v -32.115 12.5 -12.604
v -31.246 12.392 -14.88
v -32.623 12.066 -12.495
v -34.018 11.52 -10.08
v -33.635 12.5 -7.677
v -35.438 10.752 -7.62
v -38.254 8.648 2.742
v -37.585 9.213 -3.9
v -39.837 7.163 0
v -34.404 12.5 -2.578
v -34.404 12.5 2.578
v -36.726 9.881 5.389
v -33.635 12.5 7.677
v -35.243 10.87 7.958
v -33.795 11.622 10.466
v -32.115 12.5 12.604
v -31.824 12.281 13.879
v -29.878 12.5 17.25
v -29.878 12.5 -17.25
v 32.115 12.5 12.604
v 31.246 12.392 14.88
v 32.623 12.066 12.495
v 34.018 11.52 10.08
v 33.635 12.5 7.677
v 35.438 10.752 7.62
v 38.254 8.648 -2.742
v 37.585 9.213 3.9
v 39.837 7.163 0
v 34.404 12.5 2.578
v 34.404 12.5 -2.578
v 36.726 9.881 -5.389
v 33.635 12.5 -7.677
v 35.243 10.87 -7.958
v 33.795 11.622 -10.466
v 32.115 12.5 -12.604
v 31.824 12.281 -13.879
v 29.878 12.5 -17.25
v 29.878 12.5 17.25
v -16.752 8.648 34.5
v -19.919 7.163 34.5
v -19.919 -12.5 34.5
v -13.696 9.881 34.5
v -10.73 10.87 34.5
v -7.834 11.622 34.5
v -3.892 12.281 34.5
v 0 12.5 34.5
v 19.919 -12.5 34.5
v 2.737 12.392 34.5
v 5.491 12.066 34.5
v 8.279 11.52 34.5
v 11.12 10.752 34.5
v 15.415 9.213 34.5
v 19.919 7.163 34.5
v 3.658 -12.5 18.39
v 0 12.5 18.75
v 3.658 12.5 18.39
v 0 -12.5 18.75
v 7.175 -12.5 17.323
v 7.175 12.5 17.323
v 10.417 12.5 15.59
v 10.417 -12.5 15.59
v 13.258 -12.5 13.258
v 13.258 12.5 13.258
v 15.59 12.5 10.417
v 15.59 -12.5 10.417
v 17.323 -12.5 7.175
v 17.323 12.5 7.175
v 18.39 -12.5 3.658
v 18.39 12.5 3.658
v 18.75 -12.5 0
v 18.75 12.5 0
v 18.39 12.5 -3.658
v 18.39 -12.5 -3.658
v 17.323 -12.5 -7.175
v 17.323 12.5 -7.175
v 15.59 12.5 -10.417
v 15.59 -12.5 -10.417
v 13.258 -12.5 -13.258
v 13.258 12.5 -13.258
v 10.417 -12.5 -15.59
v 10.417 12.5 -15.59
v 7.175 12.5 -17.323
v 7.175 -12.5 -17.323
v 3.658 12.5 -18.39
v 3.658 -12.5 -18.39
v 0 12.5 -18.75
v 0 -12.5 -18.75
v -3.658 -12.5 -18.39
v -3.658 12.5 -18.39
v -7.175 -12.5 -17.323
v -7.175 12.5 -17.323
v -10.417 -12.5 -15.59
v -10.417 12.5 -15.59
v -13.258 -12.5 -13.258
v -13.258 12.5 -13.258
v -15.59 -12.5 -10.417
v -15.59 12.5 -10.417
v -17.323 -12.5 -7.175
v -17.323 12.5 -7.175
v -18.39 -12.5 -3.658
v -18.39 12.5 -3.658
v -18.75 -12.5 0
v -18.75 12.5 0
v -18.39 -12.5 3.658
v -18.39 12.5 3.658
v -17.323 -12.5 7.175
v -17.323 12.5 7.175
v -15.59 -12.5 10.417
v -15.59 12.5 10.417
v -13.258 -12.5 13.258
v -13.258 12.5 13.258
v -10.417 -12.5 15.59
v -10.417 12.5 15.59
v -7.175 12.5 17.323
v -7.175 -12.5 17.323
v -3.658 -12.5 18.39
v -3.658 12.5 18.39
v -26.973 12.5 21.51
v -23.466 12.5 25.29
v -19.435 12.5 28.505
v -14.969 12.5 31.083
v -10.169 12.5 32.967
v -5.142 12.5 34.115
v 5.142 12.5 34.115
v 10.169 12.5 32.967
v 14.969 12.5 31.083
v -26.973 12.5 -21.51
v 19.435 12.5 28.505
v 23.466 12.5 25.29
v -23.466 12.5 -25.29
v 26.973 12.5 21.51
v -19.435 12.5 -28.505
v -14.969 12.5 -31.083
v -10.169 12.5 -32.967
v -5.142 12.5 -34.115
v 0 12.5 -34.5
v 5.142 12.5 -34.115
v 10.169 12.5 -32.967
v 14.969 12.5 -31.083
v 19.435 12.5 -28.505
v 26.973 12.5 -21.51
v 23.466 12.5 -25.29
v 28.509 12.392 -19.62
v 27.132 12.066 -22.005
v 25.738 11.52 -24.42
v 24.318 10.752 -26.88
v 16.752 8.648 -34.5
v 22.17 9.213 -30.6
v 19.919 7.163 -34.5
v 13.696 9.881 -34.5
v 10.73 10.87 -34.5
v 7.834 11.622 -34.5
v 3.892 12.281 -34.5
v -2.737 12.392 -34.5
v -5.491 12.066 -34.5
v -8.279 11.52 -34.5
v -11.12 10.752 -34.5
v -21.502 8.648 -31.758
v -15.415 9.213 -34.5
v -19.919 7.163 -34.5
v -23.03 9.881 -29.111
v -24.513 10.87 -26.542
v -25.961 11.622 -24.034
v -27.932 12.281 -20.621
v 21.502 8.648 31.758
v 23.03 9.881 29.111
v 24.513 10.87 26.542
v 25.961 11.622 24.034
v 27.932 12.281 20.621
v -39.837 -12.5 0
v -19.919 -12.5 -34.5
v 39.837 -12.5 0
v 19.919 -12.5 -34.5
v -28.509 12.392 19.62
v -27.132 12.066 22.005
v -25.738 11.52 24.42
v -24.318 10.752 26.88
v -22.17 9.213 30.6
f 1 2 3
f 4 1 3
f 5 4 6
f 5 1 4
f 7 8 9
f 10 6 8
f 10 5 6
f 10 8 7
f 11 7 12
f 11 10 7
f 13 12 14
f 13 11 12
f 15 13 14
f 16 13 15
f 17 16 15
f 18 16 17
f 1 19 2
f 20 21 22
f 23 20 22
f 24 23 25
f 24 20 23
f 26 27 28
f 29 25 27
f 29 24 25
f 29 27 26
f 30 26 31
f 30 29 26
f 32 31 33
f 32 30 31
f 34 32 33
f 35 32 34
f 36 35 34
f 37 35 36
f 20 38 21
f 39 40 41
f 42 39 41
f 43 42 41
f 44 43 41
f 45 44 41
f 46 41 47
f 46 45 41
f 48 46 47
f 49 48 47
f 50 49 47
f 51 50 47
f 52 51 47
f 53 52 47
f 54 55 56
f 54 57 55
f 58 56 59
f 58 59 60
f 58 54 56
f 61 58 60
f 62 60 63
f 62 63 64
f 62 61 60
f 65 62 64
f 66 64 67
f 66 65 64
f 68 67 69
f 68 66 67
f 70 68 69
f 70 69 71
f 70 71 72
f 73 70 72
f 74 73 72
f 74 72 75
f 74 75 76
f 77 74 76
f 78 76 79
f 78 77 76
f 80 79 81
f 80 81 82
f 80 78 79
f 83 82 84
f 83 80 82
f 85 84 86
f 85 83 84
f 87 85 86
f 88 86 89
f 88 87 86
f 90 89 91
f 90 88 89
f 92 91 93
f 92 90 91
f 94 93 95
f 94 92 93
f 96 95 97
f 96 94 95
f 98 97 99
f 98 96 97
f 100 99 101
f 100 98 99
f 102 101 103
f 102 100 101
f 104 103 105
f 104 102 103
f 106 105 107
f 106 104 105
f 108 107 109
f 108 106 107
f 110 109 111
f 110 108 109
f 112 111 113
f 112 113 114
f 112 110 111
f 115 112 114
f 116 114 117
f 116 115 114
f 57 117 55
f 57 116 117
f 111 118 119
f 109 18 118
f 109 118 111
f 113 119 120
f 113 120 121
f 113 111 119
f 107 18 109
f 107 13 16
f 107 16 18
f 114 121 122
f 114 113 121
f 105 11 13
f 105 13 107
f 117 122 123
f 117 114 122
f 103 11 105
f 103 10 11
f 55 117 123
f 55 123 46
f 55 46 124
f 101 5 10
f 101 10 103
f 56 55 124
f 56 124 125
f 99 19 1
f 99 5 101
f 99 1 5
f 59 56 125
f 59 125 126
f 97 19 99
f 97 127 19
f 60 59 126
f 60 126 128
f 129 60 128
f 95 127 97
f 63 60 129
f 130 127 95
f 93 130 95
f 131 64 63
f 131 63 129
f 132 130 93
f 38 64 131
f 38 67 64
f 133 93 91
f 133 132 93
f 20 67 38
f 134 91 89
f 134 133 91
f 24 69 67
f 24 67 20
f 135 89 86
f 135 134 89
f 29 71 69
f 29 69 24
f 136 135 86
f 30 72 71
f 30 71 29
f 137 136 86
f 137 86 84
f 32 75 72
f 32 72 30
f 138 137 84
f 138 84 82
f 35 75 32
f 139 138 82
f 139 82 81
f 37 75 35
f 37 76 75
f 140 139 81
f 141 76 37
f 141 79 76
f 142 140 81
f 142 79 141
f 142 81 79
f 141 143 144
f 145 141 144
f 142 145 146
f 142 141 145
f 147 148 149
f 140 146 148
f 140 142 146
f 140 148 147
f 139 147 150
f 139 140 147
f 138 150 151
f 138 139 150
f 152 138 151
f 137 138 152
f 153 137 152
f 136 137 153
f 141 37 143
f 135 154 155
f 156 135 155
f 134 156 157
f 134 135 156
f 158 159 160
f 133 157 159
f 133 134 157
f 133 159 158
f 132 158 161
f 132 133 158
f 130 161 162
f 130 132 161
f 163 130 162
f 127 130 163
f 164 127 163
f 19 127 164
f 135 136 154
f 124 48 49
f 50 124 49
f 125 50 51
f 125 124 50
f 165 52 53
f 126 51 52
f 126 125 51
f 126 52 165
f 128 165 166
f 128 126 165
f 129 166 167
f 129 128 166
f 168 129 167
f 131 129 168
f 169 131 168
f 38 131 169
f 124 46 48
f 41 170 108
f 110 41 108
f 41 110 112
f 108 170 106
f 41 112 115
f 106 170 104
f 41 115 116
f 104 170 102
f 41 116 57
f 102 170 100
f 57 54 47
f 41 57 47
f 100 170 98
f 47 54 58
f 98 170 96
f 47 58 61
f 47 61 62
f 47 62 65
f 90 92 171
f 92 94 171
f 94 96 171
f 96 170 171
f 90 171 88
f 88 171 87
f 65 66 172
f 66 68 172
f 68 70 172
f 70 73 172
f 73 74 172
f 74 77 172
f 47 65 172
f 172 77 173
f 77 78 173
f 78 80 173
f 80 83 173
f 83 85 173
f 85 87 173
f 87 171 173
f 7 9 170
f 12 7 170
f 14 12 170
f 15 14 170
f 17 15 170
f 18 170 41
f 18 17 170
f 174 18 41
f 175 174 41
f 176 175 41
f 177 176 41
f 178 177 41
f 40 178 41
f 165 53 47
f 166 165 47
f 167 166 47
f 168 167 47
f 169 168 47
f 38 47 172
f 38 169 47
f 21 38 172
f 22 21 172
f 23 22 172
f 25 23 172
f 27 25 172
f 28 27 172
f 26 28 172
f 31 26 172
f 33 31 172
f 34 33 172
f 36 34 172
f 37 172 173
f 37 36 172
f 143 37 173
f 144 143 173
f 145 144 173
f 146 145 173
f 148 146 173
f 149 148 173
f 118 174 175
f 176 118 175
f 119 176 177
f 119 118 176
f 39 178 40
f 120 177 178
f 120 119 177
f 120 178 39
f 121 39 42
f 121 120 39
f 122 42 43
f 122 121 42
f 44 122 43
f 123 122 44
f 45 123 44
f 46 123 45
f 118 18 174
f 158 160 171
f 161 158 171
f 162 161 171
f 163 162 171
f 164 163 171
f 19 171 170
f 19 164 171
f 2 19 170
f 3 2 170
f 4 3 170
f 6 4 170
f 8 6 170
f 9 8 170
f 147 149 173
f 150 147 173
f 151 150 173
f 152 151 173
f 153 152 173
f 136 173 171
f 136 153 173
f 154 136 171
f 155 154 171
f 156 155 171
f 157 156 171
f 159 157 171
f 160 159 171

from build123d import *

# Parameters (mm, degrees)
SKETCH1_R           = 18.75
BOSS_EXTRUDE1_DEPTH = 12.5
SKETCH2_OUTSIDE_W   = 221.996
SKETCH2_OUTSIDE_H   = 211.322
SKETCH2_OUTSIDE_R   = 34.5
CUT_EXTRUDE1_DEPTH  = 59.328809348
CUT_EXTRUDE1_DRAFT  = -45


with BuildPart() as part:
    # Sketch1 → Boss-Extrude1 (new, symmetric)
    with BuildSketch(Plane(origin=(0, 0, 0), x_dir=(1, 0, 0), z_dir=(0, 1, 0))):
        Polygon((39.837168574, 0), (19.918584287, 34.5), (-19.918584287, 34.5), (-39.837168574, 0), (-19.918584287, -34.5), (19.918584287, -34.5), align=None)
        with Locations(Location((0, 0, 0), (0, 0, 270))):
            Circle(SKETCH1_R, mode=Mode.SUBTRACT)
    extrude(amount=BOSS_EXTRUDE1_DEPTH, both=True)


with BuildPart() as cut_extrude1_tool:
    # Sketch2 outside → Cut-Extrude1 (with draft: the straight prism first)
    with BuildSketch(Plane(origin=(0, 12.5, 0), x_dir=(1, 0, 0), z_dir=(0, 1, 0))):
        Rectangle(SKETCH2_OUTSIDE_W, SKETCH2_OUTSIDE_H)
        Circle(SKETCH2_OUTSIDE_R, mode=Mode.SUBTRACT)
    extrude(amount=-CUT_EXTRUDE1_DEPTH)
    # Cut-Extrude1: the draft: its side faces are tilted about the plane it starts from
    cut_extrude1_sides = [cut_extrude1_tool.faces().sort_by_distance(p)[0] for p in [
        (0, -17.164404674, 105.661),
        (110.998, -17.164404674, 0),
        (0, -17.164404674, -105.661),
        (-110.998, -17.164404674, 0),
        (-34.5, -17.164404674, 0),
    ]]
    draft(cut_extrude1_sides, Plane(origin=(0, 12.5, 0), x_dir=(1, 0, 0), z_dir=(0, 1, 0)), CUT_EXTRUDE1_DRAFT)


with BuildPart() as part_1:
    add(part.part)

    # Cut-Extrude1: cut by cut_extrude1_tool
    add(cut_extrude1_tool.part, mode=Mode.SUBTRACT)


solid = part_1.part
